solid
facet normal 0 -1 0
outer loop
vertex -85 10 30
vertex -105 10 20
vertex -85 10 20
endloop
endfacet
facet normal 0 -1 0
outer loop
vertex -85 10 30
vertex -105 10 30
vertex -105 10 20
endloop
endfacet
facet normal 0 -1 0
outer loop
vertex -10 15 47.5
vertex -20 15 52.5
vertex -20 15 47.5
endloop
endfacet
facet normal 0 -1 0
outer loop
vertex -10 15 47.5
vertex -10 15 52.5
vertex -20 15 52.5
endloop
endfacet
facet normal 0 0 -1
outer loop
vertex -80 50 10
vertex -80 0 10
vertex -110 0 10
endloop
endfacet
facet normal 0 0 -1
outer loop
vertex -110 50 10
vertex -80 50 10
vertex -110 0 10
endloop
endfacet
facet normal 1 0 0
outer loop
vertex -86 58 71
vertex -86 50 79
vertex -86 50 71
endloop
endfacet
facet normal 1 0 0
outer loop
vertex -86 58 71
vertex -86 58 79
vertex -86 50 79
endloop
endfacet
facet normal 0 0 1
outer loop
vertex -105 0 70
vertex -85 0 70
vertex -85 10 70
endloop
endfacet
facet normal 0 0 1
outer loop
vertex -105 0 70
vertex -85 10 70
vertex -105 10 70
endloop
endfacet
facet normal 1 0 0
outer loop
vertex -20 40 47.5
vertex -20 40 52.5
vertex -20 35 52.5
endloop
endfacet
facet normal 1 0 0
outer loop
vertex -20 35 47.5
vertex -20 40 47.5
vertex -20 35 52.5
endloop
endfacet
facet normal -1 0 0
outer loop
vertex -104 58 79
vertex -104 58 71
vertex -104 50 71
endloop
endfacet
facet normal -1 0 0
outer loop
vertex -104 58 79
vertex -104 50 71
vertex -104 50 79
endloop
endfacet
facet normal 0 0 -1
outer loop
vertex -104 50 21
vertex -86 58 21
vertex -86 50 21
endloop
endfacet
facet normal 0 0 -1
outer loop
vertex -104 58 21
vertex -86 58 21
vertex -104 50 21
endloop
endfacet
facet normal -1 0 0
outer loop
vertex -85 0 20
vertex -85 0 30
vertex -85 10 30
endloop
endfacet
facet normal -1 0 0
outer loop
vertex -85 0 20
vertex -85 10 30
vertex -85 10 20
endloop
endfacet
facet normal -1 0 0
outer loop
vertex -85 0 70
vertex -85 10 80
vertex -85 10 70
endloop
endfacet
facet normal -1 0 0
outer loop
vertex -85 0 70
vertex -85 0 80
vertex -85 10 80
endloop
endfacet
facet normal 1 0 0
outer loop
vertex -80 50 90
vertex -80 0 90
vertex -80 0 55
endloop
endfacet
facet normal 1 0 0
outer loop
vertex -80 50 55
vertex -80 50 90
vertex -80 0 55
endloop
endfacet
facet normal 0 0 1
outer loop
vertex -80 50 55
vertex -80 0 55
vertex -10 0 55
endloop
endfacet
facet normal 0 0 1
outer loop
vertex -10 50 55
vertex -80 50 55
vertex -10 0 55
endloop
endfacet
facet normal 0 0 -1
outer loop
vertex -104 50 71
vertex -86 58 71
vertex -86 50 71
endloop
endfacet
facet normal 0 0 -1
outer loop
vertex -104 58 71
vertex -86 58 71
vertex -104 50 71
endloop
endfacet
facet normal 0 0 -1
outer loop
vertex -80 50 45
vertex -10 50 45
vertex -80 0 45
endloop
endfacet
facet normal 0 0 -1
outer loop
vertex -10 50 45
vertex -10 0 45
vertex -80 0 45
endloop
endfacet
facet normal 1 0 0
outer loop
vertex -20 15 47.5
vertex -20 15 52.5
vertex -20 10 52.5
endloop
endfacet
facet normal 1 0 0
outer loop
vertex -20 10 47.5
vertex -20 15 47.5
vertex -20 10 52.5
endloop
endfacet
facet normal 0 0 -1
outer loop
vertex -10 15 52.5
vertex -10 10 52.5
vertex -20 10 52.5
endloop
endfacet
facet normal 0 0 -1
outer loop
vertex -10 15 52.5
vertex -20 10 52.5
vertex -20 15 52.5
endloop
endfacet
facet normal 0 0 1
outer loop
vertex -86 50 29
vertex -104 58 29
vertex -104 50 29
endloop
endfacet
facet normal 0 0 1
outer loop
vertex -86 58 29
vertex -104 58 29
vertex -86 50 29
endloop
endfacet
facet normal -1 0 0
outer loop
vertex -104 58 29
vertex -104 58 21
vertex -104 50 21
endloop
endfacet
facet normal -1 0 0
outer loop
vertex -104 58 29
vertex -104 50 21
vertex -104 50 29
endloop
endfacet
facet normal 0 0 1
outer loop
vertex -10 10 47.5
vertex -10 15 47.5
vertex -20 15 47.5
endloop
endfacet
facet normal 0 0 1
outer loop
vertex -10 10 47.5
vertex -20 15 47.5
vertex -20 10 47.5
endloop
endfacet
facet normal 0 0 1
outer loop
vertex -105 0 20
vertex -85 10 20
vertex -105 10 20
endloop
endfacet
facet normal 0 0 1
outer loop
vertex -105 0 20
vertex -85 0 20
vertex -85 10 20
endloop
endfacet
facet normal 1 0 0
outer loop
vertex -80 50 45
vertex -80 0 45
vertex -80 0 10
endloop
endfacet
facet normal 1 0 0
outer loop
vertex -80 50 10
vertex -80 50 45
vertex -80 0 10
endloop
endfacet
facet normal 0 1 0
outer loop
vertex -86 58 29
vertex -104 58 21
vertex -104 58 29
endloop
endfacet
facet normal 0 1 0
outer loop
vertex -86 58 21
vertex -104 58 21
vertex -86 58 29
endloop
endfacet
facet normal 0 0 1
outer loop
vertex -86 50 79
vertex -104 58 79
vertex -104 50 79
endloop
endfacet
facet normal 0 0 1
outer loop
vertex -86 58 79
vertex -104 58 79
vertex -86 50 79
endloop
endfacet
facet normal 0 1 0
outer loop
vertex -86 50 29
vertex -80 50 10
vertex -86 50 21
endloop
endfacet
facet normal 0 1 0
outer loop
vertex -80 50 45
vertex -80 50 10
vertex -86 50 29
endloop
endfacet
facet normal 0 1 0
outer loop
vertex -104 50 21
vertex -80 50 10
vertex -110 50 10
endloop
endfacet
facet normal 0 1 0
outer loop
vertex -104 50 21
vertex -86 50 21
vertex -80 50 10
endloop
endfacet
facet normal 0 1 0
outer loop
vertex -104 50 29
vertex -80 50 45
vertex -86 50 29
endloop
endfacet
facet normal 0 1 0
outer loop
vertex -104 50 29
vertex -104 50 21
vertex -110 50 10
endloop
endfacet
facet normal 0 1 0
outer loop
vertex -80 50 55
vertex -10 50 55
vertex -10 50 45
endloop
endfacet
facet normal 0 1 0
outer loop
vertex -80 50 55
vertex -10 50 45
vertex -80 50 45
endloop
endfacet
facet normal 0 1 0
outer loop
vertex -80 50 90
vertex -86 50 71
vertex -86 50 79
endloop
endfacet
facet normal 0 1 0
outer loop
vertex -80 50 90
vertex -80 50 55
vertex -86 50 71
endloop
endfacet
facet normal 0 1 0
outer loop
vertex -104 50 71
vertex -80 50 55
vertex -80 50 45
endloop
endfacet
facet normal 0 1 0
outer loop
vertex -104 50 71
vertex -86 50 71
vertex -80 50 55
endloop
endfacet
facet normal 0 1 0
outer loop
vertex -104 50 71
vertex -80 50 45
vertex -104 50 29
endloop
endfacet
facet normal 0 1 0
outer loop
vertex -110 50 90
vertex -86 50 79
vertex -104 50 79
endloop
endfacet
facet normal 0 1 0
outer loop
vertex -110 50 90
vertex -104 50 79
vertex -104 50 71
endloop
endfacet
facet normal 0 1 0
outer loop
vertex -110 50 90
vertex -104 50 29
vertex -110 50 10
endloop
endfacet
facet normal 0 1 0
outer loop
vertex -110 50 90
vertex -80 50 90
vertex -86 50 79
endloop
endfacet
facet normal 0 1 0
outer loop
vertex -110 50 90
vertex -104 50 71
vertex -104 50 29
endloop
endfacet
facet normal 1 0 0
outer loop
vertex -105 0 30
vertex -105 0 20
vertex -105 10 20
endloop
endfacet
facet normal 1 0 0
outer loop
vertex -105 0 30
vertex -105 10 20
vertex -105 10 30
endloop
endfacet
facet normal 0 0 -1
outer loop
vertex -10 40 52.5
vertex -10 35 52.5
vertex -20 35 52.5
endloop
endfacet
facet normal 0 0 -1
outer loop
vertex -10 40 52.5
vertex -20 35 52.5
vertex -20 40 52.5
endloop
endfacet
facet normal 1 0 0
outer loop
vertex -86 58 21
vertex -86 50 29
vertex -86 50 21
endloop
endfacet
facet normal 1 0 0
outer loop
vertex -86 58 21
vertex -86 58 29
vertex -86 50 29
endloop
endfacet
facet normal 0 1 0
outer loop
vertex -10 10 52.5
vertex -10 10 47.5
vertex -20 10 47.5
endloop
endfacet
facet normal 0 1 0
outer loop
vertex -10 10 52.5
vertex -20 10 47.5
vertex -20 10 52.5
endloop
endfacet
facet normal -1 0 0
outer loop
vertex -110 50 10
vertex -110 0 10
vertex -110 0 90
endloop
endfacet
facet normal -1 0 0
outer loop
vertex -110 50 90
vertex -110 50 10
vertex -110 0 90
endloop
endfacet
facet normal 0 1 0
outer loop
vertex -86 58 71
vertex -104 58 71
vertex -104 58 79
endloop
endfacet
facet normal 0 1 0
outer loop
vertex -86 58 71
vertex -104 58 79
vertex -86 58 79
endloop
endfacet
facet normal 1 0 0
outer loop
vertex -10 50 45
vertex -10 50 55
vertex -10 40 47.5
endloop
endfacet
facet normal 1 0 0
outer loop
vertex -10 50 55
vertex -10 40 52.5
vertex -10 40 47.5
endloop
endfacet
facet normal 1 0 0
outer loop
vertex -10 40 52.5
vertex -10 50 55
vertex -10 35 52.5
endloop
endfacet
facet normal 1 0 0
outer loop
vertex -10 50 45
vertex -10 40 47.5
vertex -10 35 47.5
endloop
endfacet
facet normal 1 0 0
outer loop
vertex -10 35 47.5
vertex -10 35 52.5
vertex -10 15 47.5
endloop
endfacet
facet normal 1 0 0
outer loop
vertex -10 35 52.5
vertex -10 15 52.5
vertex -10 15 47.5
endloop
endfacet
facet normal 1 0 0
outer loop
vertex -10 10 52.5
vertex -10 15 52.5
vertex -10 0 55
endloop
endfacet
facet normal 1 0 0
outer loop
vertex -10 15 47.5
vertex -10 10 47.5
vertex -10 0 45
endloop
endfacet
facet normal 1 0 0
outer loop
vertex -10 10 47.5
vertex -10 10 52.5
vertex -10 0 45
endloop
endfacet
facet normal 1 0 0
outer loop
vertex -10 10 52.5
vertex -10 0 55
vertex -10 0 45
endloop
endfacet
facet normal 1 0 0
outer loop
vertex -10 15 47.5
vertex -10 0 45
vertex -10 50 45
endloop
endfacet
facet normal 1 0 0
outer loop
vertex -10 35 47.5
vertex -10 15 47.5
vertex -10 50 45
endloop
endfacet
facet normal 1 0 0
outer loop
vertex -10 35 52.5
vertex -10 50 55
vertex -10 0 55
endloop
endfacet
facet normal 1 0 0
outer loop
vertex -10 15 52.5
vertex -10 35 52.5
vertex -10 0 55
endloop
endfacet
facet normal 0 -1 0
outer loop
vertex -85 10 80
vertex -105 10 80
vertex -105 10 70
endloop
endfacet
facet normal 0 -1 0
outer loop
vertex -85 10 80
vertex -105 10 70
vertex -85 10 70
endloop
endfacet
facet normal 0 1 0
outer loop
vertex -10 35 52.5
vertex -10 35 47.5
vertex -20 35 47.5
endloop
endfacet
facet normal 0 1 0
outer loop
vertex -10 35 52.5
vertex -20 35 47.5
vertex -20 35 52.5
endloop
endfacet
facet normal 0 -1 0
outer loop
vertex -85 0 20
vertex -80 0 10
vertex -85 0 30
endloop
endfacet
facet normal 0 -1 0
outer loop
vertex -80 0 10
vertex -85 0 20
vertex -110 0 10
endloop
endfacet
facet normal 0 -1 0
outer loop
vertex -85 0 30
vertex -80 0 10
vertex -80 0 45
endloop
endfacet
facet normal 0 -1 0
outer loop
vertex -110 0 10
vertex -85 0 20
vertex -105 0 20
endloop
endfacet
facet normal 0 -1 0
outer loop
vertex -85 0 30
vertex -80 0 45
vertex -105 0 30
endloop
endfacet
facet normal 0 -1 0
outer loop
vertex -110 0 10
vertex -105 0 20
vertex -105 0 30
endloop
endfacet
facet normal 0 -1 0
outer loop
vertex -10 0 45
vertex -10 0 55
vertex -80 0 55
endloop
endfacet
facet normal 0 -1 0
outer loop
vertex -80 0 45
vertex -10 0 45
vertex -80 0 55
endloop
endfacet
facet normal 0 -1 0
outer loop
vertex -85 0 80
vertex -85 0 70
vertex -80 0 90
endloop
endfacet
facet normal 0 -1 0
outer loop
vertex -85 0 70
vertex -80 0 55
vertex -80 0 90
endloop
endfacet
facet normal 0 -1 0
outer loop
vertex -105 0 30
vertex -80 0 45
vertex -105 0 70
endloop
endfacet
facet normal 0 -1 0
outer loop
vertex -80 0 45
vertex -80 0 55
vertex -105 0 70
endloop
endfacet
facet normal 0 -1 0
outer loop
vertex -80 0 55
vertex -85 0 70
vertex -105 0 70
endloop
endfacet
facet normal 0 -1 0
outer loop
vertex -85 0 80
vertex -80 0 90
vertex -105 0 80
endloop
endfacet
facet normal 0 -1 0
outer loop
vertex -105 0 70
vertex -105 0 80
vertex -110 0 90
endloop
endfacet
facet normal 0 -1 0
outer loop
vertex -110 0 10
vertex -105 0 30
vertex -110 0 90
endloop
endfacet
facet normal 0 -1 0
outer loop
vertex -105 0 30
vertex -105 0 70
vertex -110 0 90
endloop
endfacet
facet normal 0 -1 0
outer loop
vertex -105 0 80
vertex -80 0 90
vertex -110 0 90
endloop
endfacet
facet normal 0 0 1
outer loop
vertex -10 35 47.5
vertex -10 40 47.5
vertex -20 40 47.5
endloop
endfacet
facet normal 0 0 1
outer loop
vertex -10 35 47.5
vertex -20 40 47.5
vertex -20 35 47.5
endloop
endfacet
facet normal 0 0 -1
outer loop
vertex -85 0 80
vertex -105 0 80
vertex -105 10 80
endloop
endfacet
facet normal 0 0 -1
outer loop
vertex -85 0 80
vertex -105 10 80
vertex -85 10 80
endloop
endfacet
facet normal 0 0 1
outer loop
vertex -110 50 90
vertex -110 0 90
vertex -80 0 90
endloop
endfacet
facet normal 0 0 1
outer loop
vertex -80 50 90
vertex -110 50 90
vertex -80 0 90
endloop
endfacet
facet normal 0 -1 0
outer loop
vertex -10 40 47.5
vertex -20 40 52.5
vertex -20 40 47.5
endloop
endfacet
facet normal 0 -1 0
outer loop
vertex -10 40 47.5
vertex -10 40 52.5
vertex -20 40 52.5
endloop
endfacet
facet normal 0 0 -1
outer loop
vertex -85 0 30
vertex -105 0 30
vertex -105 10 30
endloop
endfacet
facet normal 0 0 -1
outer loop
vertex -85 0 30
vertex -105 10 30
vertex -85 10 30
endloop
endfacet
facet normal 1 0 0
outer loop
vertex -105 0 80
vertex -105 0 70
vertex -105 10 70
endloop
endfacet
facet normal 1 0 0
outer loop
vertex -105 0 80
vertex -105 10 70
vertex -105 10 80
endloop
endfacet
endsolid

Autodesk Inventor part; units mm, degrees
ref_plane "YZ Plane" through (0, 0, 0) normal (1, 0, 0) x (0, 1, 0)
ref_plane "XZ Plane" through (0, 0, 0) normal (0, 1, 0) x (-1, 0, 0)
ref_plane "XY Plane" through (0, 0, 0) normal (0, 0, 1) x (1, 0, 0)
sketch "Sketch1" plane through (0, 0, 0) normal (0, 1, 0) x (-1, 0, 0)
  line L0 (-10, -55) -> (-160, -55)
  line L1 (-160, -55) -> (-160, -45)
  line L2 (-160, -45) -> (-10, -45)
  line L3 (-10, -45) -> (-10, -55)
  line L4 (10, -55) -> (80, -55)
  line L5 (80, -55) -> (80, -90)
  line L6 (80, -90) -> (110, -90)
  line L7 (110, -90) -> (110, -10)
  line L8 (110, -10) -> (80, -10)
  line L9 (80, -10) -> (80, -45)
  line L10 (80, -45) -> (10, -45)
  line L11 (10, -45) -> (10, -55)
  line L12 (0, -122.2654) -> (0, -189.4683)
  line L13 (-10, 55) -> (-10, 45)
  line L14 (10, 55) -> (10, 45)
  line L15 (80, 10) -> (110, 10)
  line L16 (10, 45) -> (80, 45)
  line L17 (80, 45) -> (80, 10)
  line L18 (80, 55) -> (10, 55)
  line L19 (80, 90) -> (80, 55)
  line L20 (110, 10) -> (110, 90)
  line L21 (110, 90) -> (80, 90)
  line L22 (-160, 55) -> (-10, 55)
  line L23 (-160, 45) -> (-160, 55)
  line L24 (-10, 45) -> (-160, 45)
  point P0 (0, 0)
  dimension "d0" = 10
  dimension "d1" = 80
  dimension "d2" = 10
  dimension "d4" = 30
  dimension "d5" = 30
  dimension "d6" = 35
  dimension "d7" = 35
  dimension "d8" = 45
  dimension "d9" = 10
  dimension "d10" = 10
  dimension "d11" = 150
  dimension "d12" = 100
  dimension "d13" = 0
  dimension "d16" = 100
extrude "Extrusion1" add sketch "Sketch1" along normal blind 50
sketch "Sketch2" plane through (160, 0, 55) normal (1, 0, 0) x (0, 0, -1)
  line L0 (2.5, 40) -> (7.5, 40)
  line L1 (7.5, 40) -> (7.5, 35)
  line L2 (7.5, 35) -> (2.5, 35)
  line L3 (2.5, 35) -> (2.5, 40)
  line L4 (0, 50) -> (10, 50) projected
  line L5 (10, 0) -> (10, 50) projected
  line L6 (2.5, 15) -> (7.5, 15)
  line L7 (7.5, 15) -> (7.5, 10)
  line L8 (7.5, 10) -> (2.5, 10)
  line L9 (2.5, 10) -> (2.5, 15)
  line L10 (102.5, 40) -> (107.5, 40)
  line L11 (107.5, 40) -> (107.5, 35)
  line L12 (107.5, 35) -> (102.5, 35)
  line L13 (102.5, 35) -> (102.5, 40)
  line L14 (102.5, 15) -> (107.5, 15)
  line L15 (107.5, 15) -> (107.5, 10)
  line L16 (107.5, 10) -> (102.5, 10)
  line L17 (102.5, 10) -> (102.5, 15)
  point P0 (55, 0)
  dimension "d23" = 10
  dimension "d24" = 5
  dimension "d25" = 2.5
  dimension "d26" = 5
  dimension "d29" = 25
  dimension "d32" = 100
extrude "Extrusion2" cut sketch "Sketch2" against normal blind 200
sketch "Sketch3" plane through (0, 50, 0) normal (0, 1, 0) x (1, 0, 0)
  line L0 (-105, -20) -> (-85, -20)
  line L1 (-85, -20) -> (-85, -30)
  line L2 (-85, -30) -> (-105, -30)
  line L3 (-105, -30) -> (-105, -20)
  line L4 (-110, -10) -> (-110, -90) projected
  line L5 (-105, -70) -> (-85, -70)
  line L6 (-85, -70) -> (-85, -80)
  line L7 (-85, -80) -> (-105, -80)
  line L8 (-105, -80) -> (-105, -70)
  line L9 (-105, 80) -> (-85, 80)
  line L10 (-85, 80) -> (-85, 70)
  line L11 (-85, 70) -> (-105, 70)
  line L12 (-105, 70) -> (-105, 80)
  line L13 (-105, 30) -> (-85, 30)
  line L14 (-85, 30) -> (-85, 20)
  line L15 (-85, 20) -> (-105, 20)
  line L16 (-105, 20) -> (-105, 30)
  point P0 (0, 0)
  dimension "d37" = 20
  dimension "d38" = 10
  dimension "d39" = 20
  dimension "d40" = 85
  dimension "d43" = 50
  dimension "d46" = 100
extrude "Extrusion3" add sketch "Sketch3" along normal blind 8
sketch "Sketch4" plane through (0, 0, 0) normal (0, -1, 0) x (1, 0, 0)
  line L0 (-105, -70) -> (-85, -70) projected
  line L1 (-85, -70) -> (-85, -80) projected
  line L2 (-85, -80) -> (-105, -80) projected
  line L3 (-105, -80) -> (-105, -70) projected
  line L4 (-105, -20) -> (-85, -20) projected
  line L5 (-85, -20) -> (-85, -30) projected
  line L6 (-85, -30) -> (-105, -30) projected
  line L7 (-105, -30) -> (-105, -20) projected
  line L8 (-105, 30) -> (-85, 30) projected
  line L9 (-85, 30) -> (-85, 20) projected
  line L10 (-85, 20) -> (-105, 20) projected
  line L11 (-105, 20) -> (-105, 30) projected
  line L12 (-105, 80) -> (-85, 80) projected
  line L13 (-85, 80) -> (-85, 70) projected
  line L14 (-85, 70) -> (-105, 70) projected
  line L15 (-105, 70) -> (-105, 80) projected
  line L16 (-85, 80) -> (-105, 80)
  line L17 (-105, 80) -> (-105, 70)
  line L18 (-105, 70) -> (-85, 70)
  line L19 (-85, 70) -> (-85, 80)
  line L20 (-85, 30) -> (-105, 30)
  line L21 (-105, 30) -> (-105, 20)
  line L22 (-105, 20) -> (-85, 20)
  line L23 (-85, 20) -> (-85, 30)
  line L24 (-85, -20) -> (-105, -20)
  line L25 (-105, -20) -> (-105, -30)
  line L26 (-105, -30) -> (-85, -30)
  line L27 (-85, -30) -> (-85, -20)
  line L28 (-85, -70) -> (-105, -70)
  line L29 (-105, -70) -> (-105, -80)
  line L30 (-105, -80) -> (-85, -80)
  line L31 (-85, -80) -> (-85, -70)
  point P0 (0, 0)
extrude "Extrusion4" cut sketch "Sketch4" against normal blind 10
sketch "Sketch5" plane through (10, 0, 55) normal (0, 0, 1) x (1, 0, 0)
  line L0 (0, 0) -> (0, 50) projected
  line L1 (0, 50) -> (150, 50) projected
  line L2 (150, 0) -> (150, 50) projected
  line L3 (0, 0) -> (150, 0) projected
  line L4 (0, 35) -> (0, 40) projected
  line L5 (150, 35) -> (0, 35) projected
  line L6 (150, 40) -> (150, 35) projected
  line L7 (150, 40) -> (0, 40) projected
  line L8 (0, 10) -> (0, 15) projected
  line L9 (150, 10) -> (0, 10) projected
  line L10 (150, 15) -> (150, 10) projected
  line L11 (150, 15) -> (0, 15) projected
  line L12 (10, 40) -> (140, 40)
  line L13 (140, 40) -> (140, 35)
  line L14 (140, 35) -> (10, 35)
  line L15 (10, 35) -> (10, 40)
  line L16 (10, 15) -> (140, 15)
  line L17 (140, 15) -> (140, 10)
  line L18 (140, 10) -> (10, 10)
  line L19 (10, 10) -> (10, 15)
  point P0 (-10, 0)
  point P1 (10, 10)
  dimension "d53" = 10
  dimension "d54" = 10
  dimension "d55" = 10
  dimension "d56" = 10
extrude "Extrusion5" add sketch "Sketch5" against normal blind 10 contours L19 L11 L17 L9 | L15 L7 L13 L5
sketch "Sketch6" plane through (160, 0, -55) normal (0, 0, -1) x (-1, 0, 0)
  line L0 (150, 40) -> (150, 35) projected
  line L1 (0, 40) -> (150, 40) projected
  line L2 (0, 35) -> (0, 40) projected
  line L3 (0, 35) -> (150, 35) projected
  line L4 (150, 15) -> (150, 10) projected
  line L5 (0, 15) -> (150, 15) projected
  line L6 (0, 10) -> (0, 15) projected
  line L7 (0, 10) -> (150, 10) projected
  line L8 (10, 40) -> (140, 40)
  line L9 (140, 40) -> (140, 35)
  line L10 (140, 35) -> (10, 35)
  line L11 (10, 35) -> (10, 40)
  line L12 (10, 15) -> (140, 15)
  line L13 (140, 15) -> (140, 10)
  line L14 (140, 10) -> (10, 10)
  line L15 (10, 10) -> (10, 15)
  point P0 (160, 0)
  point P1 (140, 37.5)
  point P2 (10, 10)
  dimension "d59" = 10
  dimension "d60" = 10
  dimension "d61" = 10
  dimension "d62" = 10
extrude "Extrusion6" add sketch "Sketch6" against normal blind 10 contours L9 L3 L11 L1 | L13 L7 L15 L5
sketch "Sketch7" plane through (0, 58, 0) normal (0, 1, 0) x (1, 0, 0)
  line L0 (-105, -80) -> (-85, -80) projected
  line L1 (-85, -80) -> (-85, -70) projected
  line L2 (-85, -70) -> (-105, -70) projected
  line L3 (-105, -70) -> (-105, -80) projected
  line L4 (-105, -30) -> (-85, -30) projected
  line L5 (-85, -30) -> (-85, -20) projected
  line L6 (-85, -20) -> (-105, -20) projected
  line L7 (-105, -20) -> (-105, -30) projected
  line L8 (-105, 20) -> (-85, 20) projected
  line L9 (-85, 20) -> (-85, 30) projected
  line L10 (-85, 30) -> (-105, 30) projected
  line L11 (-105, 30) -> (-105, 20) projected
  line L12 (-105, 70) -> (-85, 70) projected
  line L13 (-85, 70) -> (-85, 80) projected
  line L14 (-85, 80) -> (-105, 80) projected
  line L15 (-105, 80) -> (-105, 70) projected
  line L16 (-104, -79) -> (-86, -79)
  line L17 (-86, -79) -> (-86, -71)
  line L18 (-86, -71) -> (-104, -71)
  line L19 (-104, -71) -> (-104, -79)
  line L20 (-86, -21) -> (-104, -21)
  line L21 (-104, -21) -> (-104, -29)
  line L22 (-104, -29) -> (-86, -29)
  line L23 (-86, -29) -> (-86, -21)
  line L24 (-86, 29) -> (-104, 29)
  line L25 (-104, 29) -> (-104, 21)
  line L26 (-104, 21) -> (-86, 21)
  line L27 (-86, 21) -> (-86, 29)
  line L28 (-86, 79) -> (-104, 79)
  line L29 (-104, 79) -> (-104, 71)
  line L30 (-104, 71) -> (-86, 71)
  line L31 (-86, 71) -> (-86, 79)
  line L32 (-105, -80) -> (-85, -80)
  line L33 (-85, -80) -> (-85, -70)
  line L34 (-85, -70) -> (-105, -70)
  line L35 (-105, -70) -> (-105, -80)
  line L36 (-105, -30) -> (-85, -30)
  line L37 (-85, -30) -> (-85, -20)
  line L38 (-85, -20) -> (-105, -20)
  line L39 (-105, -20) -> (-105, -30)
  line L40 (-105, 20) -> (-85, 20)
  line L41 (-85, 20) -> (-85, 30)
  line L42 (-85, 30) -> (-105, 30)
  line L43 (-105, 30) -> (-105, 20)
  line L44 (-105, 70) -> (-85, 70)
  line L45 (-85, 70) -> (-85, 80)
  line L46 (-85, 80) -> (-105, 80)
  line L47 (-105, 80) -> (-105, 70)
  point P0 (0, 0)
  dimension "d65" = 1
  dimension "d66" = 1
  dimension "d67" = 1
  dimension "d68" = 1
  dimension "d71" = 50
  dimension "d74" = 100
extrude "Extrusion7" cut sketch "Sketch7" against normal blind 8
sketch "Sketch8" plane through (-80, 0, 55) normal (0, 0, 1) x (1, 0, 0)
  line L0 (70, 40) -> (70, 35) projected
  line L1 (70, 40) -> (40, 40) projected
  line L2 (40, 40) -> (40, 35) projected
  line L3 (70, 35) -> (40, 35) projected
  line L4 (70, 15) -> (70, 10) projected
  line L5 (70, 15) -> (40, 15) projected
  line L6 (40, 15) -> (40, 10) projected
  line L7 (70, 10) -> (40, 10) projected
  line L8 (40, 40) -> (60, 40)
  line L9 (60, 40) -> (60, 35)
  line L10 (60, 35) -> (40, 35)
  line L11 (40, 35) -> (40, 40)
  line L12 (40, 15) -> (60, 15)
  line L13 (60, 15) -> (60, 10)
  line L14 (60, 10) -> (40, 10)
  line L15 (40, 10) -> (40, 15)
  point P0 (80, 0)
  point P1 (60, 15)
  point P2 (60, 40)
  dimension "d79" = 10
  dimension "d80" = 10
extrude "Extrusion8" add sketch "Sketch8" against normal blind 10 contours L9 L3 L2 L1 | L13 L7 L6 L5
sketch "Sketch9" plane through (-10, 0, -55) normal (0, 0, -1) x (-1, 0, 0)
  line L0 (0, 35) -> (0, 40) projected
  line L1 (0, 35) -> (30, 35) projected
  line L2 (30, 35) -> (30, 40) projected
  line L3 (0, 40) -> (30, 40) projected
  line L4 (0, 10) -> (0, 15) projected
  line L5 (0, 10) -> (30, 10) projected
  line L6 (30, 10) -> (30, 15) projected
  line L7 (0, 15) -> (30, 15) projected
  line L8 (30, 40) -> (10, 40)
  line L9 (10, 40) -> (10, 10)
  line L10 (10, 10) -> (30, 10)
  line L11 (30, 10) -> (30, 40)
  point P0 (-10, 0)
  point P1 (0, 37.5)
  dimension "d83" = 10
extrude "Extrusion9" add sketch "Sketch9" against normal blind 10 contours L9 L3 L2 L1 | L1 L11 L7 L9 | L7 L6 L5 L9
sketch "Sketch10" plane through (0, 58, 0) normal (0, 1, 0) x (1, 0, 0)
  line L0 (-140, 100) -> (-140, 0)
  line L1 (-140, 0) -> (0, 0)
  line L2 (0, 0) -> (0, -100)
  line L3 (0, -100) -> (180, -100)
  line L4 (180, -100) -> (180, 100)
  line L5 (180, 100) -> (-140, 100)
  dimension "d86" = 100
  dimension "d87" = 320
  dimension "d88" = 200
  dimension "d89" = 180
extrude "Extrusion10" cut sketch "Sketch10" against normal through all
properties part number "Hurdle Split"
